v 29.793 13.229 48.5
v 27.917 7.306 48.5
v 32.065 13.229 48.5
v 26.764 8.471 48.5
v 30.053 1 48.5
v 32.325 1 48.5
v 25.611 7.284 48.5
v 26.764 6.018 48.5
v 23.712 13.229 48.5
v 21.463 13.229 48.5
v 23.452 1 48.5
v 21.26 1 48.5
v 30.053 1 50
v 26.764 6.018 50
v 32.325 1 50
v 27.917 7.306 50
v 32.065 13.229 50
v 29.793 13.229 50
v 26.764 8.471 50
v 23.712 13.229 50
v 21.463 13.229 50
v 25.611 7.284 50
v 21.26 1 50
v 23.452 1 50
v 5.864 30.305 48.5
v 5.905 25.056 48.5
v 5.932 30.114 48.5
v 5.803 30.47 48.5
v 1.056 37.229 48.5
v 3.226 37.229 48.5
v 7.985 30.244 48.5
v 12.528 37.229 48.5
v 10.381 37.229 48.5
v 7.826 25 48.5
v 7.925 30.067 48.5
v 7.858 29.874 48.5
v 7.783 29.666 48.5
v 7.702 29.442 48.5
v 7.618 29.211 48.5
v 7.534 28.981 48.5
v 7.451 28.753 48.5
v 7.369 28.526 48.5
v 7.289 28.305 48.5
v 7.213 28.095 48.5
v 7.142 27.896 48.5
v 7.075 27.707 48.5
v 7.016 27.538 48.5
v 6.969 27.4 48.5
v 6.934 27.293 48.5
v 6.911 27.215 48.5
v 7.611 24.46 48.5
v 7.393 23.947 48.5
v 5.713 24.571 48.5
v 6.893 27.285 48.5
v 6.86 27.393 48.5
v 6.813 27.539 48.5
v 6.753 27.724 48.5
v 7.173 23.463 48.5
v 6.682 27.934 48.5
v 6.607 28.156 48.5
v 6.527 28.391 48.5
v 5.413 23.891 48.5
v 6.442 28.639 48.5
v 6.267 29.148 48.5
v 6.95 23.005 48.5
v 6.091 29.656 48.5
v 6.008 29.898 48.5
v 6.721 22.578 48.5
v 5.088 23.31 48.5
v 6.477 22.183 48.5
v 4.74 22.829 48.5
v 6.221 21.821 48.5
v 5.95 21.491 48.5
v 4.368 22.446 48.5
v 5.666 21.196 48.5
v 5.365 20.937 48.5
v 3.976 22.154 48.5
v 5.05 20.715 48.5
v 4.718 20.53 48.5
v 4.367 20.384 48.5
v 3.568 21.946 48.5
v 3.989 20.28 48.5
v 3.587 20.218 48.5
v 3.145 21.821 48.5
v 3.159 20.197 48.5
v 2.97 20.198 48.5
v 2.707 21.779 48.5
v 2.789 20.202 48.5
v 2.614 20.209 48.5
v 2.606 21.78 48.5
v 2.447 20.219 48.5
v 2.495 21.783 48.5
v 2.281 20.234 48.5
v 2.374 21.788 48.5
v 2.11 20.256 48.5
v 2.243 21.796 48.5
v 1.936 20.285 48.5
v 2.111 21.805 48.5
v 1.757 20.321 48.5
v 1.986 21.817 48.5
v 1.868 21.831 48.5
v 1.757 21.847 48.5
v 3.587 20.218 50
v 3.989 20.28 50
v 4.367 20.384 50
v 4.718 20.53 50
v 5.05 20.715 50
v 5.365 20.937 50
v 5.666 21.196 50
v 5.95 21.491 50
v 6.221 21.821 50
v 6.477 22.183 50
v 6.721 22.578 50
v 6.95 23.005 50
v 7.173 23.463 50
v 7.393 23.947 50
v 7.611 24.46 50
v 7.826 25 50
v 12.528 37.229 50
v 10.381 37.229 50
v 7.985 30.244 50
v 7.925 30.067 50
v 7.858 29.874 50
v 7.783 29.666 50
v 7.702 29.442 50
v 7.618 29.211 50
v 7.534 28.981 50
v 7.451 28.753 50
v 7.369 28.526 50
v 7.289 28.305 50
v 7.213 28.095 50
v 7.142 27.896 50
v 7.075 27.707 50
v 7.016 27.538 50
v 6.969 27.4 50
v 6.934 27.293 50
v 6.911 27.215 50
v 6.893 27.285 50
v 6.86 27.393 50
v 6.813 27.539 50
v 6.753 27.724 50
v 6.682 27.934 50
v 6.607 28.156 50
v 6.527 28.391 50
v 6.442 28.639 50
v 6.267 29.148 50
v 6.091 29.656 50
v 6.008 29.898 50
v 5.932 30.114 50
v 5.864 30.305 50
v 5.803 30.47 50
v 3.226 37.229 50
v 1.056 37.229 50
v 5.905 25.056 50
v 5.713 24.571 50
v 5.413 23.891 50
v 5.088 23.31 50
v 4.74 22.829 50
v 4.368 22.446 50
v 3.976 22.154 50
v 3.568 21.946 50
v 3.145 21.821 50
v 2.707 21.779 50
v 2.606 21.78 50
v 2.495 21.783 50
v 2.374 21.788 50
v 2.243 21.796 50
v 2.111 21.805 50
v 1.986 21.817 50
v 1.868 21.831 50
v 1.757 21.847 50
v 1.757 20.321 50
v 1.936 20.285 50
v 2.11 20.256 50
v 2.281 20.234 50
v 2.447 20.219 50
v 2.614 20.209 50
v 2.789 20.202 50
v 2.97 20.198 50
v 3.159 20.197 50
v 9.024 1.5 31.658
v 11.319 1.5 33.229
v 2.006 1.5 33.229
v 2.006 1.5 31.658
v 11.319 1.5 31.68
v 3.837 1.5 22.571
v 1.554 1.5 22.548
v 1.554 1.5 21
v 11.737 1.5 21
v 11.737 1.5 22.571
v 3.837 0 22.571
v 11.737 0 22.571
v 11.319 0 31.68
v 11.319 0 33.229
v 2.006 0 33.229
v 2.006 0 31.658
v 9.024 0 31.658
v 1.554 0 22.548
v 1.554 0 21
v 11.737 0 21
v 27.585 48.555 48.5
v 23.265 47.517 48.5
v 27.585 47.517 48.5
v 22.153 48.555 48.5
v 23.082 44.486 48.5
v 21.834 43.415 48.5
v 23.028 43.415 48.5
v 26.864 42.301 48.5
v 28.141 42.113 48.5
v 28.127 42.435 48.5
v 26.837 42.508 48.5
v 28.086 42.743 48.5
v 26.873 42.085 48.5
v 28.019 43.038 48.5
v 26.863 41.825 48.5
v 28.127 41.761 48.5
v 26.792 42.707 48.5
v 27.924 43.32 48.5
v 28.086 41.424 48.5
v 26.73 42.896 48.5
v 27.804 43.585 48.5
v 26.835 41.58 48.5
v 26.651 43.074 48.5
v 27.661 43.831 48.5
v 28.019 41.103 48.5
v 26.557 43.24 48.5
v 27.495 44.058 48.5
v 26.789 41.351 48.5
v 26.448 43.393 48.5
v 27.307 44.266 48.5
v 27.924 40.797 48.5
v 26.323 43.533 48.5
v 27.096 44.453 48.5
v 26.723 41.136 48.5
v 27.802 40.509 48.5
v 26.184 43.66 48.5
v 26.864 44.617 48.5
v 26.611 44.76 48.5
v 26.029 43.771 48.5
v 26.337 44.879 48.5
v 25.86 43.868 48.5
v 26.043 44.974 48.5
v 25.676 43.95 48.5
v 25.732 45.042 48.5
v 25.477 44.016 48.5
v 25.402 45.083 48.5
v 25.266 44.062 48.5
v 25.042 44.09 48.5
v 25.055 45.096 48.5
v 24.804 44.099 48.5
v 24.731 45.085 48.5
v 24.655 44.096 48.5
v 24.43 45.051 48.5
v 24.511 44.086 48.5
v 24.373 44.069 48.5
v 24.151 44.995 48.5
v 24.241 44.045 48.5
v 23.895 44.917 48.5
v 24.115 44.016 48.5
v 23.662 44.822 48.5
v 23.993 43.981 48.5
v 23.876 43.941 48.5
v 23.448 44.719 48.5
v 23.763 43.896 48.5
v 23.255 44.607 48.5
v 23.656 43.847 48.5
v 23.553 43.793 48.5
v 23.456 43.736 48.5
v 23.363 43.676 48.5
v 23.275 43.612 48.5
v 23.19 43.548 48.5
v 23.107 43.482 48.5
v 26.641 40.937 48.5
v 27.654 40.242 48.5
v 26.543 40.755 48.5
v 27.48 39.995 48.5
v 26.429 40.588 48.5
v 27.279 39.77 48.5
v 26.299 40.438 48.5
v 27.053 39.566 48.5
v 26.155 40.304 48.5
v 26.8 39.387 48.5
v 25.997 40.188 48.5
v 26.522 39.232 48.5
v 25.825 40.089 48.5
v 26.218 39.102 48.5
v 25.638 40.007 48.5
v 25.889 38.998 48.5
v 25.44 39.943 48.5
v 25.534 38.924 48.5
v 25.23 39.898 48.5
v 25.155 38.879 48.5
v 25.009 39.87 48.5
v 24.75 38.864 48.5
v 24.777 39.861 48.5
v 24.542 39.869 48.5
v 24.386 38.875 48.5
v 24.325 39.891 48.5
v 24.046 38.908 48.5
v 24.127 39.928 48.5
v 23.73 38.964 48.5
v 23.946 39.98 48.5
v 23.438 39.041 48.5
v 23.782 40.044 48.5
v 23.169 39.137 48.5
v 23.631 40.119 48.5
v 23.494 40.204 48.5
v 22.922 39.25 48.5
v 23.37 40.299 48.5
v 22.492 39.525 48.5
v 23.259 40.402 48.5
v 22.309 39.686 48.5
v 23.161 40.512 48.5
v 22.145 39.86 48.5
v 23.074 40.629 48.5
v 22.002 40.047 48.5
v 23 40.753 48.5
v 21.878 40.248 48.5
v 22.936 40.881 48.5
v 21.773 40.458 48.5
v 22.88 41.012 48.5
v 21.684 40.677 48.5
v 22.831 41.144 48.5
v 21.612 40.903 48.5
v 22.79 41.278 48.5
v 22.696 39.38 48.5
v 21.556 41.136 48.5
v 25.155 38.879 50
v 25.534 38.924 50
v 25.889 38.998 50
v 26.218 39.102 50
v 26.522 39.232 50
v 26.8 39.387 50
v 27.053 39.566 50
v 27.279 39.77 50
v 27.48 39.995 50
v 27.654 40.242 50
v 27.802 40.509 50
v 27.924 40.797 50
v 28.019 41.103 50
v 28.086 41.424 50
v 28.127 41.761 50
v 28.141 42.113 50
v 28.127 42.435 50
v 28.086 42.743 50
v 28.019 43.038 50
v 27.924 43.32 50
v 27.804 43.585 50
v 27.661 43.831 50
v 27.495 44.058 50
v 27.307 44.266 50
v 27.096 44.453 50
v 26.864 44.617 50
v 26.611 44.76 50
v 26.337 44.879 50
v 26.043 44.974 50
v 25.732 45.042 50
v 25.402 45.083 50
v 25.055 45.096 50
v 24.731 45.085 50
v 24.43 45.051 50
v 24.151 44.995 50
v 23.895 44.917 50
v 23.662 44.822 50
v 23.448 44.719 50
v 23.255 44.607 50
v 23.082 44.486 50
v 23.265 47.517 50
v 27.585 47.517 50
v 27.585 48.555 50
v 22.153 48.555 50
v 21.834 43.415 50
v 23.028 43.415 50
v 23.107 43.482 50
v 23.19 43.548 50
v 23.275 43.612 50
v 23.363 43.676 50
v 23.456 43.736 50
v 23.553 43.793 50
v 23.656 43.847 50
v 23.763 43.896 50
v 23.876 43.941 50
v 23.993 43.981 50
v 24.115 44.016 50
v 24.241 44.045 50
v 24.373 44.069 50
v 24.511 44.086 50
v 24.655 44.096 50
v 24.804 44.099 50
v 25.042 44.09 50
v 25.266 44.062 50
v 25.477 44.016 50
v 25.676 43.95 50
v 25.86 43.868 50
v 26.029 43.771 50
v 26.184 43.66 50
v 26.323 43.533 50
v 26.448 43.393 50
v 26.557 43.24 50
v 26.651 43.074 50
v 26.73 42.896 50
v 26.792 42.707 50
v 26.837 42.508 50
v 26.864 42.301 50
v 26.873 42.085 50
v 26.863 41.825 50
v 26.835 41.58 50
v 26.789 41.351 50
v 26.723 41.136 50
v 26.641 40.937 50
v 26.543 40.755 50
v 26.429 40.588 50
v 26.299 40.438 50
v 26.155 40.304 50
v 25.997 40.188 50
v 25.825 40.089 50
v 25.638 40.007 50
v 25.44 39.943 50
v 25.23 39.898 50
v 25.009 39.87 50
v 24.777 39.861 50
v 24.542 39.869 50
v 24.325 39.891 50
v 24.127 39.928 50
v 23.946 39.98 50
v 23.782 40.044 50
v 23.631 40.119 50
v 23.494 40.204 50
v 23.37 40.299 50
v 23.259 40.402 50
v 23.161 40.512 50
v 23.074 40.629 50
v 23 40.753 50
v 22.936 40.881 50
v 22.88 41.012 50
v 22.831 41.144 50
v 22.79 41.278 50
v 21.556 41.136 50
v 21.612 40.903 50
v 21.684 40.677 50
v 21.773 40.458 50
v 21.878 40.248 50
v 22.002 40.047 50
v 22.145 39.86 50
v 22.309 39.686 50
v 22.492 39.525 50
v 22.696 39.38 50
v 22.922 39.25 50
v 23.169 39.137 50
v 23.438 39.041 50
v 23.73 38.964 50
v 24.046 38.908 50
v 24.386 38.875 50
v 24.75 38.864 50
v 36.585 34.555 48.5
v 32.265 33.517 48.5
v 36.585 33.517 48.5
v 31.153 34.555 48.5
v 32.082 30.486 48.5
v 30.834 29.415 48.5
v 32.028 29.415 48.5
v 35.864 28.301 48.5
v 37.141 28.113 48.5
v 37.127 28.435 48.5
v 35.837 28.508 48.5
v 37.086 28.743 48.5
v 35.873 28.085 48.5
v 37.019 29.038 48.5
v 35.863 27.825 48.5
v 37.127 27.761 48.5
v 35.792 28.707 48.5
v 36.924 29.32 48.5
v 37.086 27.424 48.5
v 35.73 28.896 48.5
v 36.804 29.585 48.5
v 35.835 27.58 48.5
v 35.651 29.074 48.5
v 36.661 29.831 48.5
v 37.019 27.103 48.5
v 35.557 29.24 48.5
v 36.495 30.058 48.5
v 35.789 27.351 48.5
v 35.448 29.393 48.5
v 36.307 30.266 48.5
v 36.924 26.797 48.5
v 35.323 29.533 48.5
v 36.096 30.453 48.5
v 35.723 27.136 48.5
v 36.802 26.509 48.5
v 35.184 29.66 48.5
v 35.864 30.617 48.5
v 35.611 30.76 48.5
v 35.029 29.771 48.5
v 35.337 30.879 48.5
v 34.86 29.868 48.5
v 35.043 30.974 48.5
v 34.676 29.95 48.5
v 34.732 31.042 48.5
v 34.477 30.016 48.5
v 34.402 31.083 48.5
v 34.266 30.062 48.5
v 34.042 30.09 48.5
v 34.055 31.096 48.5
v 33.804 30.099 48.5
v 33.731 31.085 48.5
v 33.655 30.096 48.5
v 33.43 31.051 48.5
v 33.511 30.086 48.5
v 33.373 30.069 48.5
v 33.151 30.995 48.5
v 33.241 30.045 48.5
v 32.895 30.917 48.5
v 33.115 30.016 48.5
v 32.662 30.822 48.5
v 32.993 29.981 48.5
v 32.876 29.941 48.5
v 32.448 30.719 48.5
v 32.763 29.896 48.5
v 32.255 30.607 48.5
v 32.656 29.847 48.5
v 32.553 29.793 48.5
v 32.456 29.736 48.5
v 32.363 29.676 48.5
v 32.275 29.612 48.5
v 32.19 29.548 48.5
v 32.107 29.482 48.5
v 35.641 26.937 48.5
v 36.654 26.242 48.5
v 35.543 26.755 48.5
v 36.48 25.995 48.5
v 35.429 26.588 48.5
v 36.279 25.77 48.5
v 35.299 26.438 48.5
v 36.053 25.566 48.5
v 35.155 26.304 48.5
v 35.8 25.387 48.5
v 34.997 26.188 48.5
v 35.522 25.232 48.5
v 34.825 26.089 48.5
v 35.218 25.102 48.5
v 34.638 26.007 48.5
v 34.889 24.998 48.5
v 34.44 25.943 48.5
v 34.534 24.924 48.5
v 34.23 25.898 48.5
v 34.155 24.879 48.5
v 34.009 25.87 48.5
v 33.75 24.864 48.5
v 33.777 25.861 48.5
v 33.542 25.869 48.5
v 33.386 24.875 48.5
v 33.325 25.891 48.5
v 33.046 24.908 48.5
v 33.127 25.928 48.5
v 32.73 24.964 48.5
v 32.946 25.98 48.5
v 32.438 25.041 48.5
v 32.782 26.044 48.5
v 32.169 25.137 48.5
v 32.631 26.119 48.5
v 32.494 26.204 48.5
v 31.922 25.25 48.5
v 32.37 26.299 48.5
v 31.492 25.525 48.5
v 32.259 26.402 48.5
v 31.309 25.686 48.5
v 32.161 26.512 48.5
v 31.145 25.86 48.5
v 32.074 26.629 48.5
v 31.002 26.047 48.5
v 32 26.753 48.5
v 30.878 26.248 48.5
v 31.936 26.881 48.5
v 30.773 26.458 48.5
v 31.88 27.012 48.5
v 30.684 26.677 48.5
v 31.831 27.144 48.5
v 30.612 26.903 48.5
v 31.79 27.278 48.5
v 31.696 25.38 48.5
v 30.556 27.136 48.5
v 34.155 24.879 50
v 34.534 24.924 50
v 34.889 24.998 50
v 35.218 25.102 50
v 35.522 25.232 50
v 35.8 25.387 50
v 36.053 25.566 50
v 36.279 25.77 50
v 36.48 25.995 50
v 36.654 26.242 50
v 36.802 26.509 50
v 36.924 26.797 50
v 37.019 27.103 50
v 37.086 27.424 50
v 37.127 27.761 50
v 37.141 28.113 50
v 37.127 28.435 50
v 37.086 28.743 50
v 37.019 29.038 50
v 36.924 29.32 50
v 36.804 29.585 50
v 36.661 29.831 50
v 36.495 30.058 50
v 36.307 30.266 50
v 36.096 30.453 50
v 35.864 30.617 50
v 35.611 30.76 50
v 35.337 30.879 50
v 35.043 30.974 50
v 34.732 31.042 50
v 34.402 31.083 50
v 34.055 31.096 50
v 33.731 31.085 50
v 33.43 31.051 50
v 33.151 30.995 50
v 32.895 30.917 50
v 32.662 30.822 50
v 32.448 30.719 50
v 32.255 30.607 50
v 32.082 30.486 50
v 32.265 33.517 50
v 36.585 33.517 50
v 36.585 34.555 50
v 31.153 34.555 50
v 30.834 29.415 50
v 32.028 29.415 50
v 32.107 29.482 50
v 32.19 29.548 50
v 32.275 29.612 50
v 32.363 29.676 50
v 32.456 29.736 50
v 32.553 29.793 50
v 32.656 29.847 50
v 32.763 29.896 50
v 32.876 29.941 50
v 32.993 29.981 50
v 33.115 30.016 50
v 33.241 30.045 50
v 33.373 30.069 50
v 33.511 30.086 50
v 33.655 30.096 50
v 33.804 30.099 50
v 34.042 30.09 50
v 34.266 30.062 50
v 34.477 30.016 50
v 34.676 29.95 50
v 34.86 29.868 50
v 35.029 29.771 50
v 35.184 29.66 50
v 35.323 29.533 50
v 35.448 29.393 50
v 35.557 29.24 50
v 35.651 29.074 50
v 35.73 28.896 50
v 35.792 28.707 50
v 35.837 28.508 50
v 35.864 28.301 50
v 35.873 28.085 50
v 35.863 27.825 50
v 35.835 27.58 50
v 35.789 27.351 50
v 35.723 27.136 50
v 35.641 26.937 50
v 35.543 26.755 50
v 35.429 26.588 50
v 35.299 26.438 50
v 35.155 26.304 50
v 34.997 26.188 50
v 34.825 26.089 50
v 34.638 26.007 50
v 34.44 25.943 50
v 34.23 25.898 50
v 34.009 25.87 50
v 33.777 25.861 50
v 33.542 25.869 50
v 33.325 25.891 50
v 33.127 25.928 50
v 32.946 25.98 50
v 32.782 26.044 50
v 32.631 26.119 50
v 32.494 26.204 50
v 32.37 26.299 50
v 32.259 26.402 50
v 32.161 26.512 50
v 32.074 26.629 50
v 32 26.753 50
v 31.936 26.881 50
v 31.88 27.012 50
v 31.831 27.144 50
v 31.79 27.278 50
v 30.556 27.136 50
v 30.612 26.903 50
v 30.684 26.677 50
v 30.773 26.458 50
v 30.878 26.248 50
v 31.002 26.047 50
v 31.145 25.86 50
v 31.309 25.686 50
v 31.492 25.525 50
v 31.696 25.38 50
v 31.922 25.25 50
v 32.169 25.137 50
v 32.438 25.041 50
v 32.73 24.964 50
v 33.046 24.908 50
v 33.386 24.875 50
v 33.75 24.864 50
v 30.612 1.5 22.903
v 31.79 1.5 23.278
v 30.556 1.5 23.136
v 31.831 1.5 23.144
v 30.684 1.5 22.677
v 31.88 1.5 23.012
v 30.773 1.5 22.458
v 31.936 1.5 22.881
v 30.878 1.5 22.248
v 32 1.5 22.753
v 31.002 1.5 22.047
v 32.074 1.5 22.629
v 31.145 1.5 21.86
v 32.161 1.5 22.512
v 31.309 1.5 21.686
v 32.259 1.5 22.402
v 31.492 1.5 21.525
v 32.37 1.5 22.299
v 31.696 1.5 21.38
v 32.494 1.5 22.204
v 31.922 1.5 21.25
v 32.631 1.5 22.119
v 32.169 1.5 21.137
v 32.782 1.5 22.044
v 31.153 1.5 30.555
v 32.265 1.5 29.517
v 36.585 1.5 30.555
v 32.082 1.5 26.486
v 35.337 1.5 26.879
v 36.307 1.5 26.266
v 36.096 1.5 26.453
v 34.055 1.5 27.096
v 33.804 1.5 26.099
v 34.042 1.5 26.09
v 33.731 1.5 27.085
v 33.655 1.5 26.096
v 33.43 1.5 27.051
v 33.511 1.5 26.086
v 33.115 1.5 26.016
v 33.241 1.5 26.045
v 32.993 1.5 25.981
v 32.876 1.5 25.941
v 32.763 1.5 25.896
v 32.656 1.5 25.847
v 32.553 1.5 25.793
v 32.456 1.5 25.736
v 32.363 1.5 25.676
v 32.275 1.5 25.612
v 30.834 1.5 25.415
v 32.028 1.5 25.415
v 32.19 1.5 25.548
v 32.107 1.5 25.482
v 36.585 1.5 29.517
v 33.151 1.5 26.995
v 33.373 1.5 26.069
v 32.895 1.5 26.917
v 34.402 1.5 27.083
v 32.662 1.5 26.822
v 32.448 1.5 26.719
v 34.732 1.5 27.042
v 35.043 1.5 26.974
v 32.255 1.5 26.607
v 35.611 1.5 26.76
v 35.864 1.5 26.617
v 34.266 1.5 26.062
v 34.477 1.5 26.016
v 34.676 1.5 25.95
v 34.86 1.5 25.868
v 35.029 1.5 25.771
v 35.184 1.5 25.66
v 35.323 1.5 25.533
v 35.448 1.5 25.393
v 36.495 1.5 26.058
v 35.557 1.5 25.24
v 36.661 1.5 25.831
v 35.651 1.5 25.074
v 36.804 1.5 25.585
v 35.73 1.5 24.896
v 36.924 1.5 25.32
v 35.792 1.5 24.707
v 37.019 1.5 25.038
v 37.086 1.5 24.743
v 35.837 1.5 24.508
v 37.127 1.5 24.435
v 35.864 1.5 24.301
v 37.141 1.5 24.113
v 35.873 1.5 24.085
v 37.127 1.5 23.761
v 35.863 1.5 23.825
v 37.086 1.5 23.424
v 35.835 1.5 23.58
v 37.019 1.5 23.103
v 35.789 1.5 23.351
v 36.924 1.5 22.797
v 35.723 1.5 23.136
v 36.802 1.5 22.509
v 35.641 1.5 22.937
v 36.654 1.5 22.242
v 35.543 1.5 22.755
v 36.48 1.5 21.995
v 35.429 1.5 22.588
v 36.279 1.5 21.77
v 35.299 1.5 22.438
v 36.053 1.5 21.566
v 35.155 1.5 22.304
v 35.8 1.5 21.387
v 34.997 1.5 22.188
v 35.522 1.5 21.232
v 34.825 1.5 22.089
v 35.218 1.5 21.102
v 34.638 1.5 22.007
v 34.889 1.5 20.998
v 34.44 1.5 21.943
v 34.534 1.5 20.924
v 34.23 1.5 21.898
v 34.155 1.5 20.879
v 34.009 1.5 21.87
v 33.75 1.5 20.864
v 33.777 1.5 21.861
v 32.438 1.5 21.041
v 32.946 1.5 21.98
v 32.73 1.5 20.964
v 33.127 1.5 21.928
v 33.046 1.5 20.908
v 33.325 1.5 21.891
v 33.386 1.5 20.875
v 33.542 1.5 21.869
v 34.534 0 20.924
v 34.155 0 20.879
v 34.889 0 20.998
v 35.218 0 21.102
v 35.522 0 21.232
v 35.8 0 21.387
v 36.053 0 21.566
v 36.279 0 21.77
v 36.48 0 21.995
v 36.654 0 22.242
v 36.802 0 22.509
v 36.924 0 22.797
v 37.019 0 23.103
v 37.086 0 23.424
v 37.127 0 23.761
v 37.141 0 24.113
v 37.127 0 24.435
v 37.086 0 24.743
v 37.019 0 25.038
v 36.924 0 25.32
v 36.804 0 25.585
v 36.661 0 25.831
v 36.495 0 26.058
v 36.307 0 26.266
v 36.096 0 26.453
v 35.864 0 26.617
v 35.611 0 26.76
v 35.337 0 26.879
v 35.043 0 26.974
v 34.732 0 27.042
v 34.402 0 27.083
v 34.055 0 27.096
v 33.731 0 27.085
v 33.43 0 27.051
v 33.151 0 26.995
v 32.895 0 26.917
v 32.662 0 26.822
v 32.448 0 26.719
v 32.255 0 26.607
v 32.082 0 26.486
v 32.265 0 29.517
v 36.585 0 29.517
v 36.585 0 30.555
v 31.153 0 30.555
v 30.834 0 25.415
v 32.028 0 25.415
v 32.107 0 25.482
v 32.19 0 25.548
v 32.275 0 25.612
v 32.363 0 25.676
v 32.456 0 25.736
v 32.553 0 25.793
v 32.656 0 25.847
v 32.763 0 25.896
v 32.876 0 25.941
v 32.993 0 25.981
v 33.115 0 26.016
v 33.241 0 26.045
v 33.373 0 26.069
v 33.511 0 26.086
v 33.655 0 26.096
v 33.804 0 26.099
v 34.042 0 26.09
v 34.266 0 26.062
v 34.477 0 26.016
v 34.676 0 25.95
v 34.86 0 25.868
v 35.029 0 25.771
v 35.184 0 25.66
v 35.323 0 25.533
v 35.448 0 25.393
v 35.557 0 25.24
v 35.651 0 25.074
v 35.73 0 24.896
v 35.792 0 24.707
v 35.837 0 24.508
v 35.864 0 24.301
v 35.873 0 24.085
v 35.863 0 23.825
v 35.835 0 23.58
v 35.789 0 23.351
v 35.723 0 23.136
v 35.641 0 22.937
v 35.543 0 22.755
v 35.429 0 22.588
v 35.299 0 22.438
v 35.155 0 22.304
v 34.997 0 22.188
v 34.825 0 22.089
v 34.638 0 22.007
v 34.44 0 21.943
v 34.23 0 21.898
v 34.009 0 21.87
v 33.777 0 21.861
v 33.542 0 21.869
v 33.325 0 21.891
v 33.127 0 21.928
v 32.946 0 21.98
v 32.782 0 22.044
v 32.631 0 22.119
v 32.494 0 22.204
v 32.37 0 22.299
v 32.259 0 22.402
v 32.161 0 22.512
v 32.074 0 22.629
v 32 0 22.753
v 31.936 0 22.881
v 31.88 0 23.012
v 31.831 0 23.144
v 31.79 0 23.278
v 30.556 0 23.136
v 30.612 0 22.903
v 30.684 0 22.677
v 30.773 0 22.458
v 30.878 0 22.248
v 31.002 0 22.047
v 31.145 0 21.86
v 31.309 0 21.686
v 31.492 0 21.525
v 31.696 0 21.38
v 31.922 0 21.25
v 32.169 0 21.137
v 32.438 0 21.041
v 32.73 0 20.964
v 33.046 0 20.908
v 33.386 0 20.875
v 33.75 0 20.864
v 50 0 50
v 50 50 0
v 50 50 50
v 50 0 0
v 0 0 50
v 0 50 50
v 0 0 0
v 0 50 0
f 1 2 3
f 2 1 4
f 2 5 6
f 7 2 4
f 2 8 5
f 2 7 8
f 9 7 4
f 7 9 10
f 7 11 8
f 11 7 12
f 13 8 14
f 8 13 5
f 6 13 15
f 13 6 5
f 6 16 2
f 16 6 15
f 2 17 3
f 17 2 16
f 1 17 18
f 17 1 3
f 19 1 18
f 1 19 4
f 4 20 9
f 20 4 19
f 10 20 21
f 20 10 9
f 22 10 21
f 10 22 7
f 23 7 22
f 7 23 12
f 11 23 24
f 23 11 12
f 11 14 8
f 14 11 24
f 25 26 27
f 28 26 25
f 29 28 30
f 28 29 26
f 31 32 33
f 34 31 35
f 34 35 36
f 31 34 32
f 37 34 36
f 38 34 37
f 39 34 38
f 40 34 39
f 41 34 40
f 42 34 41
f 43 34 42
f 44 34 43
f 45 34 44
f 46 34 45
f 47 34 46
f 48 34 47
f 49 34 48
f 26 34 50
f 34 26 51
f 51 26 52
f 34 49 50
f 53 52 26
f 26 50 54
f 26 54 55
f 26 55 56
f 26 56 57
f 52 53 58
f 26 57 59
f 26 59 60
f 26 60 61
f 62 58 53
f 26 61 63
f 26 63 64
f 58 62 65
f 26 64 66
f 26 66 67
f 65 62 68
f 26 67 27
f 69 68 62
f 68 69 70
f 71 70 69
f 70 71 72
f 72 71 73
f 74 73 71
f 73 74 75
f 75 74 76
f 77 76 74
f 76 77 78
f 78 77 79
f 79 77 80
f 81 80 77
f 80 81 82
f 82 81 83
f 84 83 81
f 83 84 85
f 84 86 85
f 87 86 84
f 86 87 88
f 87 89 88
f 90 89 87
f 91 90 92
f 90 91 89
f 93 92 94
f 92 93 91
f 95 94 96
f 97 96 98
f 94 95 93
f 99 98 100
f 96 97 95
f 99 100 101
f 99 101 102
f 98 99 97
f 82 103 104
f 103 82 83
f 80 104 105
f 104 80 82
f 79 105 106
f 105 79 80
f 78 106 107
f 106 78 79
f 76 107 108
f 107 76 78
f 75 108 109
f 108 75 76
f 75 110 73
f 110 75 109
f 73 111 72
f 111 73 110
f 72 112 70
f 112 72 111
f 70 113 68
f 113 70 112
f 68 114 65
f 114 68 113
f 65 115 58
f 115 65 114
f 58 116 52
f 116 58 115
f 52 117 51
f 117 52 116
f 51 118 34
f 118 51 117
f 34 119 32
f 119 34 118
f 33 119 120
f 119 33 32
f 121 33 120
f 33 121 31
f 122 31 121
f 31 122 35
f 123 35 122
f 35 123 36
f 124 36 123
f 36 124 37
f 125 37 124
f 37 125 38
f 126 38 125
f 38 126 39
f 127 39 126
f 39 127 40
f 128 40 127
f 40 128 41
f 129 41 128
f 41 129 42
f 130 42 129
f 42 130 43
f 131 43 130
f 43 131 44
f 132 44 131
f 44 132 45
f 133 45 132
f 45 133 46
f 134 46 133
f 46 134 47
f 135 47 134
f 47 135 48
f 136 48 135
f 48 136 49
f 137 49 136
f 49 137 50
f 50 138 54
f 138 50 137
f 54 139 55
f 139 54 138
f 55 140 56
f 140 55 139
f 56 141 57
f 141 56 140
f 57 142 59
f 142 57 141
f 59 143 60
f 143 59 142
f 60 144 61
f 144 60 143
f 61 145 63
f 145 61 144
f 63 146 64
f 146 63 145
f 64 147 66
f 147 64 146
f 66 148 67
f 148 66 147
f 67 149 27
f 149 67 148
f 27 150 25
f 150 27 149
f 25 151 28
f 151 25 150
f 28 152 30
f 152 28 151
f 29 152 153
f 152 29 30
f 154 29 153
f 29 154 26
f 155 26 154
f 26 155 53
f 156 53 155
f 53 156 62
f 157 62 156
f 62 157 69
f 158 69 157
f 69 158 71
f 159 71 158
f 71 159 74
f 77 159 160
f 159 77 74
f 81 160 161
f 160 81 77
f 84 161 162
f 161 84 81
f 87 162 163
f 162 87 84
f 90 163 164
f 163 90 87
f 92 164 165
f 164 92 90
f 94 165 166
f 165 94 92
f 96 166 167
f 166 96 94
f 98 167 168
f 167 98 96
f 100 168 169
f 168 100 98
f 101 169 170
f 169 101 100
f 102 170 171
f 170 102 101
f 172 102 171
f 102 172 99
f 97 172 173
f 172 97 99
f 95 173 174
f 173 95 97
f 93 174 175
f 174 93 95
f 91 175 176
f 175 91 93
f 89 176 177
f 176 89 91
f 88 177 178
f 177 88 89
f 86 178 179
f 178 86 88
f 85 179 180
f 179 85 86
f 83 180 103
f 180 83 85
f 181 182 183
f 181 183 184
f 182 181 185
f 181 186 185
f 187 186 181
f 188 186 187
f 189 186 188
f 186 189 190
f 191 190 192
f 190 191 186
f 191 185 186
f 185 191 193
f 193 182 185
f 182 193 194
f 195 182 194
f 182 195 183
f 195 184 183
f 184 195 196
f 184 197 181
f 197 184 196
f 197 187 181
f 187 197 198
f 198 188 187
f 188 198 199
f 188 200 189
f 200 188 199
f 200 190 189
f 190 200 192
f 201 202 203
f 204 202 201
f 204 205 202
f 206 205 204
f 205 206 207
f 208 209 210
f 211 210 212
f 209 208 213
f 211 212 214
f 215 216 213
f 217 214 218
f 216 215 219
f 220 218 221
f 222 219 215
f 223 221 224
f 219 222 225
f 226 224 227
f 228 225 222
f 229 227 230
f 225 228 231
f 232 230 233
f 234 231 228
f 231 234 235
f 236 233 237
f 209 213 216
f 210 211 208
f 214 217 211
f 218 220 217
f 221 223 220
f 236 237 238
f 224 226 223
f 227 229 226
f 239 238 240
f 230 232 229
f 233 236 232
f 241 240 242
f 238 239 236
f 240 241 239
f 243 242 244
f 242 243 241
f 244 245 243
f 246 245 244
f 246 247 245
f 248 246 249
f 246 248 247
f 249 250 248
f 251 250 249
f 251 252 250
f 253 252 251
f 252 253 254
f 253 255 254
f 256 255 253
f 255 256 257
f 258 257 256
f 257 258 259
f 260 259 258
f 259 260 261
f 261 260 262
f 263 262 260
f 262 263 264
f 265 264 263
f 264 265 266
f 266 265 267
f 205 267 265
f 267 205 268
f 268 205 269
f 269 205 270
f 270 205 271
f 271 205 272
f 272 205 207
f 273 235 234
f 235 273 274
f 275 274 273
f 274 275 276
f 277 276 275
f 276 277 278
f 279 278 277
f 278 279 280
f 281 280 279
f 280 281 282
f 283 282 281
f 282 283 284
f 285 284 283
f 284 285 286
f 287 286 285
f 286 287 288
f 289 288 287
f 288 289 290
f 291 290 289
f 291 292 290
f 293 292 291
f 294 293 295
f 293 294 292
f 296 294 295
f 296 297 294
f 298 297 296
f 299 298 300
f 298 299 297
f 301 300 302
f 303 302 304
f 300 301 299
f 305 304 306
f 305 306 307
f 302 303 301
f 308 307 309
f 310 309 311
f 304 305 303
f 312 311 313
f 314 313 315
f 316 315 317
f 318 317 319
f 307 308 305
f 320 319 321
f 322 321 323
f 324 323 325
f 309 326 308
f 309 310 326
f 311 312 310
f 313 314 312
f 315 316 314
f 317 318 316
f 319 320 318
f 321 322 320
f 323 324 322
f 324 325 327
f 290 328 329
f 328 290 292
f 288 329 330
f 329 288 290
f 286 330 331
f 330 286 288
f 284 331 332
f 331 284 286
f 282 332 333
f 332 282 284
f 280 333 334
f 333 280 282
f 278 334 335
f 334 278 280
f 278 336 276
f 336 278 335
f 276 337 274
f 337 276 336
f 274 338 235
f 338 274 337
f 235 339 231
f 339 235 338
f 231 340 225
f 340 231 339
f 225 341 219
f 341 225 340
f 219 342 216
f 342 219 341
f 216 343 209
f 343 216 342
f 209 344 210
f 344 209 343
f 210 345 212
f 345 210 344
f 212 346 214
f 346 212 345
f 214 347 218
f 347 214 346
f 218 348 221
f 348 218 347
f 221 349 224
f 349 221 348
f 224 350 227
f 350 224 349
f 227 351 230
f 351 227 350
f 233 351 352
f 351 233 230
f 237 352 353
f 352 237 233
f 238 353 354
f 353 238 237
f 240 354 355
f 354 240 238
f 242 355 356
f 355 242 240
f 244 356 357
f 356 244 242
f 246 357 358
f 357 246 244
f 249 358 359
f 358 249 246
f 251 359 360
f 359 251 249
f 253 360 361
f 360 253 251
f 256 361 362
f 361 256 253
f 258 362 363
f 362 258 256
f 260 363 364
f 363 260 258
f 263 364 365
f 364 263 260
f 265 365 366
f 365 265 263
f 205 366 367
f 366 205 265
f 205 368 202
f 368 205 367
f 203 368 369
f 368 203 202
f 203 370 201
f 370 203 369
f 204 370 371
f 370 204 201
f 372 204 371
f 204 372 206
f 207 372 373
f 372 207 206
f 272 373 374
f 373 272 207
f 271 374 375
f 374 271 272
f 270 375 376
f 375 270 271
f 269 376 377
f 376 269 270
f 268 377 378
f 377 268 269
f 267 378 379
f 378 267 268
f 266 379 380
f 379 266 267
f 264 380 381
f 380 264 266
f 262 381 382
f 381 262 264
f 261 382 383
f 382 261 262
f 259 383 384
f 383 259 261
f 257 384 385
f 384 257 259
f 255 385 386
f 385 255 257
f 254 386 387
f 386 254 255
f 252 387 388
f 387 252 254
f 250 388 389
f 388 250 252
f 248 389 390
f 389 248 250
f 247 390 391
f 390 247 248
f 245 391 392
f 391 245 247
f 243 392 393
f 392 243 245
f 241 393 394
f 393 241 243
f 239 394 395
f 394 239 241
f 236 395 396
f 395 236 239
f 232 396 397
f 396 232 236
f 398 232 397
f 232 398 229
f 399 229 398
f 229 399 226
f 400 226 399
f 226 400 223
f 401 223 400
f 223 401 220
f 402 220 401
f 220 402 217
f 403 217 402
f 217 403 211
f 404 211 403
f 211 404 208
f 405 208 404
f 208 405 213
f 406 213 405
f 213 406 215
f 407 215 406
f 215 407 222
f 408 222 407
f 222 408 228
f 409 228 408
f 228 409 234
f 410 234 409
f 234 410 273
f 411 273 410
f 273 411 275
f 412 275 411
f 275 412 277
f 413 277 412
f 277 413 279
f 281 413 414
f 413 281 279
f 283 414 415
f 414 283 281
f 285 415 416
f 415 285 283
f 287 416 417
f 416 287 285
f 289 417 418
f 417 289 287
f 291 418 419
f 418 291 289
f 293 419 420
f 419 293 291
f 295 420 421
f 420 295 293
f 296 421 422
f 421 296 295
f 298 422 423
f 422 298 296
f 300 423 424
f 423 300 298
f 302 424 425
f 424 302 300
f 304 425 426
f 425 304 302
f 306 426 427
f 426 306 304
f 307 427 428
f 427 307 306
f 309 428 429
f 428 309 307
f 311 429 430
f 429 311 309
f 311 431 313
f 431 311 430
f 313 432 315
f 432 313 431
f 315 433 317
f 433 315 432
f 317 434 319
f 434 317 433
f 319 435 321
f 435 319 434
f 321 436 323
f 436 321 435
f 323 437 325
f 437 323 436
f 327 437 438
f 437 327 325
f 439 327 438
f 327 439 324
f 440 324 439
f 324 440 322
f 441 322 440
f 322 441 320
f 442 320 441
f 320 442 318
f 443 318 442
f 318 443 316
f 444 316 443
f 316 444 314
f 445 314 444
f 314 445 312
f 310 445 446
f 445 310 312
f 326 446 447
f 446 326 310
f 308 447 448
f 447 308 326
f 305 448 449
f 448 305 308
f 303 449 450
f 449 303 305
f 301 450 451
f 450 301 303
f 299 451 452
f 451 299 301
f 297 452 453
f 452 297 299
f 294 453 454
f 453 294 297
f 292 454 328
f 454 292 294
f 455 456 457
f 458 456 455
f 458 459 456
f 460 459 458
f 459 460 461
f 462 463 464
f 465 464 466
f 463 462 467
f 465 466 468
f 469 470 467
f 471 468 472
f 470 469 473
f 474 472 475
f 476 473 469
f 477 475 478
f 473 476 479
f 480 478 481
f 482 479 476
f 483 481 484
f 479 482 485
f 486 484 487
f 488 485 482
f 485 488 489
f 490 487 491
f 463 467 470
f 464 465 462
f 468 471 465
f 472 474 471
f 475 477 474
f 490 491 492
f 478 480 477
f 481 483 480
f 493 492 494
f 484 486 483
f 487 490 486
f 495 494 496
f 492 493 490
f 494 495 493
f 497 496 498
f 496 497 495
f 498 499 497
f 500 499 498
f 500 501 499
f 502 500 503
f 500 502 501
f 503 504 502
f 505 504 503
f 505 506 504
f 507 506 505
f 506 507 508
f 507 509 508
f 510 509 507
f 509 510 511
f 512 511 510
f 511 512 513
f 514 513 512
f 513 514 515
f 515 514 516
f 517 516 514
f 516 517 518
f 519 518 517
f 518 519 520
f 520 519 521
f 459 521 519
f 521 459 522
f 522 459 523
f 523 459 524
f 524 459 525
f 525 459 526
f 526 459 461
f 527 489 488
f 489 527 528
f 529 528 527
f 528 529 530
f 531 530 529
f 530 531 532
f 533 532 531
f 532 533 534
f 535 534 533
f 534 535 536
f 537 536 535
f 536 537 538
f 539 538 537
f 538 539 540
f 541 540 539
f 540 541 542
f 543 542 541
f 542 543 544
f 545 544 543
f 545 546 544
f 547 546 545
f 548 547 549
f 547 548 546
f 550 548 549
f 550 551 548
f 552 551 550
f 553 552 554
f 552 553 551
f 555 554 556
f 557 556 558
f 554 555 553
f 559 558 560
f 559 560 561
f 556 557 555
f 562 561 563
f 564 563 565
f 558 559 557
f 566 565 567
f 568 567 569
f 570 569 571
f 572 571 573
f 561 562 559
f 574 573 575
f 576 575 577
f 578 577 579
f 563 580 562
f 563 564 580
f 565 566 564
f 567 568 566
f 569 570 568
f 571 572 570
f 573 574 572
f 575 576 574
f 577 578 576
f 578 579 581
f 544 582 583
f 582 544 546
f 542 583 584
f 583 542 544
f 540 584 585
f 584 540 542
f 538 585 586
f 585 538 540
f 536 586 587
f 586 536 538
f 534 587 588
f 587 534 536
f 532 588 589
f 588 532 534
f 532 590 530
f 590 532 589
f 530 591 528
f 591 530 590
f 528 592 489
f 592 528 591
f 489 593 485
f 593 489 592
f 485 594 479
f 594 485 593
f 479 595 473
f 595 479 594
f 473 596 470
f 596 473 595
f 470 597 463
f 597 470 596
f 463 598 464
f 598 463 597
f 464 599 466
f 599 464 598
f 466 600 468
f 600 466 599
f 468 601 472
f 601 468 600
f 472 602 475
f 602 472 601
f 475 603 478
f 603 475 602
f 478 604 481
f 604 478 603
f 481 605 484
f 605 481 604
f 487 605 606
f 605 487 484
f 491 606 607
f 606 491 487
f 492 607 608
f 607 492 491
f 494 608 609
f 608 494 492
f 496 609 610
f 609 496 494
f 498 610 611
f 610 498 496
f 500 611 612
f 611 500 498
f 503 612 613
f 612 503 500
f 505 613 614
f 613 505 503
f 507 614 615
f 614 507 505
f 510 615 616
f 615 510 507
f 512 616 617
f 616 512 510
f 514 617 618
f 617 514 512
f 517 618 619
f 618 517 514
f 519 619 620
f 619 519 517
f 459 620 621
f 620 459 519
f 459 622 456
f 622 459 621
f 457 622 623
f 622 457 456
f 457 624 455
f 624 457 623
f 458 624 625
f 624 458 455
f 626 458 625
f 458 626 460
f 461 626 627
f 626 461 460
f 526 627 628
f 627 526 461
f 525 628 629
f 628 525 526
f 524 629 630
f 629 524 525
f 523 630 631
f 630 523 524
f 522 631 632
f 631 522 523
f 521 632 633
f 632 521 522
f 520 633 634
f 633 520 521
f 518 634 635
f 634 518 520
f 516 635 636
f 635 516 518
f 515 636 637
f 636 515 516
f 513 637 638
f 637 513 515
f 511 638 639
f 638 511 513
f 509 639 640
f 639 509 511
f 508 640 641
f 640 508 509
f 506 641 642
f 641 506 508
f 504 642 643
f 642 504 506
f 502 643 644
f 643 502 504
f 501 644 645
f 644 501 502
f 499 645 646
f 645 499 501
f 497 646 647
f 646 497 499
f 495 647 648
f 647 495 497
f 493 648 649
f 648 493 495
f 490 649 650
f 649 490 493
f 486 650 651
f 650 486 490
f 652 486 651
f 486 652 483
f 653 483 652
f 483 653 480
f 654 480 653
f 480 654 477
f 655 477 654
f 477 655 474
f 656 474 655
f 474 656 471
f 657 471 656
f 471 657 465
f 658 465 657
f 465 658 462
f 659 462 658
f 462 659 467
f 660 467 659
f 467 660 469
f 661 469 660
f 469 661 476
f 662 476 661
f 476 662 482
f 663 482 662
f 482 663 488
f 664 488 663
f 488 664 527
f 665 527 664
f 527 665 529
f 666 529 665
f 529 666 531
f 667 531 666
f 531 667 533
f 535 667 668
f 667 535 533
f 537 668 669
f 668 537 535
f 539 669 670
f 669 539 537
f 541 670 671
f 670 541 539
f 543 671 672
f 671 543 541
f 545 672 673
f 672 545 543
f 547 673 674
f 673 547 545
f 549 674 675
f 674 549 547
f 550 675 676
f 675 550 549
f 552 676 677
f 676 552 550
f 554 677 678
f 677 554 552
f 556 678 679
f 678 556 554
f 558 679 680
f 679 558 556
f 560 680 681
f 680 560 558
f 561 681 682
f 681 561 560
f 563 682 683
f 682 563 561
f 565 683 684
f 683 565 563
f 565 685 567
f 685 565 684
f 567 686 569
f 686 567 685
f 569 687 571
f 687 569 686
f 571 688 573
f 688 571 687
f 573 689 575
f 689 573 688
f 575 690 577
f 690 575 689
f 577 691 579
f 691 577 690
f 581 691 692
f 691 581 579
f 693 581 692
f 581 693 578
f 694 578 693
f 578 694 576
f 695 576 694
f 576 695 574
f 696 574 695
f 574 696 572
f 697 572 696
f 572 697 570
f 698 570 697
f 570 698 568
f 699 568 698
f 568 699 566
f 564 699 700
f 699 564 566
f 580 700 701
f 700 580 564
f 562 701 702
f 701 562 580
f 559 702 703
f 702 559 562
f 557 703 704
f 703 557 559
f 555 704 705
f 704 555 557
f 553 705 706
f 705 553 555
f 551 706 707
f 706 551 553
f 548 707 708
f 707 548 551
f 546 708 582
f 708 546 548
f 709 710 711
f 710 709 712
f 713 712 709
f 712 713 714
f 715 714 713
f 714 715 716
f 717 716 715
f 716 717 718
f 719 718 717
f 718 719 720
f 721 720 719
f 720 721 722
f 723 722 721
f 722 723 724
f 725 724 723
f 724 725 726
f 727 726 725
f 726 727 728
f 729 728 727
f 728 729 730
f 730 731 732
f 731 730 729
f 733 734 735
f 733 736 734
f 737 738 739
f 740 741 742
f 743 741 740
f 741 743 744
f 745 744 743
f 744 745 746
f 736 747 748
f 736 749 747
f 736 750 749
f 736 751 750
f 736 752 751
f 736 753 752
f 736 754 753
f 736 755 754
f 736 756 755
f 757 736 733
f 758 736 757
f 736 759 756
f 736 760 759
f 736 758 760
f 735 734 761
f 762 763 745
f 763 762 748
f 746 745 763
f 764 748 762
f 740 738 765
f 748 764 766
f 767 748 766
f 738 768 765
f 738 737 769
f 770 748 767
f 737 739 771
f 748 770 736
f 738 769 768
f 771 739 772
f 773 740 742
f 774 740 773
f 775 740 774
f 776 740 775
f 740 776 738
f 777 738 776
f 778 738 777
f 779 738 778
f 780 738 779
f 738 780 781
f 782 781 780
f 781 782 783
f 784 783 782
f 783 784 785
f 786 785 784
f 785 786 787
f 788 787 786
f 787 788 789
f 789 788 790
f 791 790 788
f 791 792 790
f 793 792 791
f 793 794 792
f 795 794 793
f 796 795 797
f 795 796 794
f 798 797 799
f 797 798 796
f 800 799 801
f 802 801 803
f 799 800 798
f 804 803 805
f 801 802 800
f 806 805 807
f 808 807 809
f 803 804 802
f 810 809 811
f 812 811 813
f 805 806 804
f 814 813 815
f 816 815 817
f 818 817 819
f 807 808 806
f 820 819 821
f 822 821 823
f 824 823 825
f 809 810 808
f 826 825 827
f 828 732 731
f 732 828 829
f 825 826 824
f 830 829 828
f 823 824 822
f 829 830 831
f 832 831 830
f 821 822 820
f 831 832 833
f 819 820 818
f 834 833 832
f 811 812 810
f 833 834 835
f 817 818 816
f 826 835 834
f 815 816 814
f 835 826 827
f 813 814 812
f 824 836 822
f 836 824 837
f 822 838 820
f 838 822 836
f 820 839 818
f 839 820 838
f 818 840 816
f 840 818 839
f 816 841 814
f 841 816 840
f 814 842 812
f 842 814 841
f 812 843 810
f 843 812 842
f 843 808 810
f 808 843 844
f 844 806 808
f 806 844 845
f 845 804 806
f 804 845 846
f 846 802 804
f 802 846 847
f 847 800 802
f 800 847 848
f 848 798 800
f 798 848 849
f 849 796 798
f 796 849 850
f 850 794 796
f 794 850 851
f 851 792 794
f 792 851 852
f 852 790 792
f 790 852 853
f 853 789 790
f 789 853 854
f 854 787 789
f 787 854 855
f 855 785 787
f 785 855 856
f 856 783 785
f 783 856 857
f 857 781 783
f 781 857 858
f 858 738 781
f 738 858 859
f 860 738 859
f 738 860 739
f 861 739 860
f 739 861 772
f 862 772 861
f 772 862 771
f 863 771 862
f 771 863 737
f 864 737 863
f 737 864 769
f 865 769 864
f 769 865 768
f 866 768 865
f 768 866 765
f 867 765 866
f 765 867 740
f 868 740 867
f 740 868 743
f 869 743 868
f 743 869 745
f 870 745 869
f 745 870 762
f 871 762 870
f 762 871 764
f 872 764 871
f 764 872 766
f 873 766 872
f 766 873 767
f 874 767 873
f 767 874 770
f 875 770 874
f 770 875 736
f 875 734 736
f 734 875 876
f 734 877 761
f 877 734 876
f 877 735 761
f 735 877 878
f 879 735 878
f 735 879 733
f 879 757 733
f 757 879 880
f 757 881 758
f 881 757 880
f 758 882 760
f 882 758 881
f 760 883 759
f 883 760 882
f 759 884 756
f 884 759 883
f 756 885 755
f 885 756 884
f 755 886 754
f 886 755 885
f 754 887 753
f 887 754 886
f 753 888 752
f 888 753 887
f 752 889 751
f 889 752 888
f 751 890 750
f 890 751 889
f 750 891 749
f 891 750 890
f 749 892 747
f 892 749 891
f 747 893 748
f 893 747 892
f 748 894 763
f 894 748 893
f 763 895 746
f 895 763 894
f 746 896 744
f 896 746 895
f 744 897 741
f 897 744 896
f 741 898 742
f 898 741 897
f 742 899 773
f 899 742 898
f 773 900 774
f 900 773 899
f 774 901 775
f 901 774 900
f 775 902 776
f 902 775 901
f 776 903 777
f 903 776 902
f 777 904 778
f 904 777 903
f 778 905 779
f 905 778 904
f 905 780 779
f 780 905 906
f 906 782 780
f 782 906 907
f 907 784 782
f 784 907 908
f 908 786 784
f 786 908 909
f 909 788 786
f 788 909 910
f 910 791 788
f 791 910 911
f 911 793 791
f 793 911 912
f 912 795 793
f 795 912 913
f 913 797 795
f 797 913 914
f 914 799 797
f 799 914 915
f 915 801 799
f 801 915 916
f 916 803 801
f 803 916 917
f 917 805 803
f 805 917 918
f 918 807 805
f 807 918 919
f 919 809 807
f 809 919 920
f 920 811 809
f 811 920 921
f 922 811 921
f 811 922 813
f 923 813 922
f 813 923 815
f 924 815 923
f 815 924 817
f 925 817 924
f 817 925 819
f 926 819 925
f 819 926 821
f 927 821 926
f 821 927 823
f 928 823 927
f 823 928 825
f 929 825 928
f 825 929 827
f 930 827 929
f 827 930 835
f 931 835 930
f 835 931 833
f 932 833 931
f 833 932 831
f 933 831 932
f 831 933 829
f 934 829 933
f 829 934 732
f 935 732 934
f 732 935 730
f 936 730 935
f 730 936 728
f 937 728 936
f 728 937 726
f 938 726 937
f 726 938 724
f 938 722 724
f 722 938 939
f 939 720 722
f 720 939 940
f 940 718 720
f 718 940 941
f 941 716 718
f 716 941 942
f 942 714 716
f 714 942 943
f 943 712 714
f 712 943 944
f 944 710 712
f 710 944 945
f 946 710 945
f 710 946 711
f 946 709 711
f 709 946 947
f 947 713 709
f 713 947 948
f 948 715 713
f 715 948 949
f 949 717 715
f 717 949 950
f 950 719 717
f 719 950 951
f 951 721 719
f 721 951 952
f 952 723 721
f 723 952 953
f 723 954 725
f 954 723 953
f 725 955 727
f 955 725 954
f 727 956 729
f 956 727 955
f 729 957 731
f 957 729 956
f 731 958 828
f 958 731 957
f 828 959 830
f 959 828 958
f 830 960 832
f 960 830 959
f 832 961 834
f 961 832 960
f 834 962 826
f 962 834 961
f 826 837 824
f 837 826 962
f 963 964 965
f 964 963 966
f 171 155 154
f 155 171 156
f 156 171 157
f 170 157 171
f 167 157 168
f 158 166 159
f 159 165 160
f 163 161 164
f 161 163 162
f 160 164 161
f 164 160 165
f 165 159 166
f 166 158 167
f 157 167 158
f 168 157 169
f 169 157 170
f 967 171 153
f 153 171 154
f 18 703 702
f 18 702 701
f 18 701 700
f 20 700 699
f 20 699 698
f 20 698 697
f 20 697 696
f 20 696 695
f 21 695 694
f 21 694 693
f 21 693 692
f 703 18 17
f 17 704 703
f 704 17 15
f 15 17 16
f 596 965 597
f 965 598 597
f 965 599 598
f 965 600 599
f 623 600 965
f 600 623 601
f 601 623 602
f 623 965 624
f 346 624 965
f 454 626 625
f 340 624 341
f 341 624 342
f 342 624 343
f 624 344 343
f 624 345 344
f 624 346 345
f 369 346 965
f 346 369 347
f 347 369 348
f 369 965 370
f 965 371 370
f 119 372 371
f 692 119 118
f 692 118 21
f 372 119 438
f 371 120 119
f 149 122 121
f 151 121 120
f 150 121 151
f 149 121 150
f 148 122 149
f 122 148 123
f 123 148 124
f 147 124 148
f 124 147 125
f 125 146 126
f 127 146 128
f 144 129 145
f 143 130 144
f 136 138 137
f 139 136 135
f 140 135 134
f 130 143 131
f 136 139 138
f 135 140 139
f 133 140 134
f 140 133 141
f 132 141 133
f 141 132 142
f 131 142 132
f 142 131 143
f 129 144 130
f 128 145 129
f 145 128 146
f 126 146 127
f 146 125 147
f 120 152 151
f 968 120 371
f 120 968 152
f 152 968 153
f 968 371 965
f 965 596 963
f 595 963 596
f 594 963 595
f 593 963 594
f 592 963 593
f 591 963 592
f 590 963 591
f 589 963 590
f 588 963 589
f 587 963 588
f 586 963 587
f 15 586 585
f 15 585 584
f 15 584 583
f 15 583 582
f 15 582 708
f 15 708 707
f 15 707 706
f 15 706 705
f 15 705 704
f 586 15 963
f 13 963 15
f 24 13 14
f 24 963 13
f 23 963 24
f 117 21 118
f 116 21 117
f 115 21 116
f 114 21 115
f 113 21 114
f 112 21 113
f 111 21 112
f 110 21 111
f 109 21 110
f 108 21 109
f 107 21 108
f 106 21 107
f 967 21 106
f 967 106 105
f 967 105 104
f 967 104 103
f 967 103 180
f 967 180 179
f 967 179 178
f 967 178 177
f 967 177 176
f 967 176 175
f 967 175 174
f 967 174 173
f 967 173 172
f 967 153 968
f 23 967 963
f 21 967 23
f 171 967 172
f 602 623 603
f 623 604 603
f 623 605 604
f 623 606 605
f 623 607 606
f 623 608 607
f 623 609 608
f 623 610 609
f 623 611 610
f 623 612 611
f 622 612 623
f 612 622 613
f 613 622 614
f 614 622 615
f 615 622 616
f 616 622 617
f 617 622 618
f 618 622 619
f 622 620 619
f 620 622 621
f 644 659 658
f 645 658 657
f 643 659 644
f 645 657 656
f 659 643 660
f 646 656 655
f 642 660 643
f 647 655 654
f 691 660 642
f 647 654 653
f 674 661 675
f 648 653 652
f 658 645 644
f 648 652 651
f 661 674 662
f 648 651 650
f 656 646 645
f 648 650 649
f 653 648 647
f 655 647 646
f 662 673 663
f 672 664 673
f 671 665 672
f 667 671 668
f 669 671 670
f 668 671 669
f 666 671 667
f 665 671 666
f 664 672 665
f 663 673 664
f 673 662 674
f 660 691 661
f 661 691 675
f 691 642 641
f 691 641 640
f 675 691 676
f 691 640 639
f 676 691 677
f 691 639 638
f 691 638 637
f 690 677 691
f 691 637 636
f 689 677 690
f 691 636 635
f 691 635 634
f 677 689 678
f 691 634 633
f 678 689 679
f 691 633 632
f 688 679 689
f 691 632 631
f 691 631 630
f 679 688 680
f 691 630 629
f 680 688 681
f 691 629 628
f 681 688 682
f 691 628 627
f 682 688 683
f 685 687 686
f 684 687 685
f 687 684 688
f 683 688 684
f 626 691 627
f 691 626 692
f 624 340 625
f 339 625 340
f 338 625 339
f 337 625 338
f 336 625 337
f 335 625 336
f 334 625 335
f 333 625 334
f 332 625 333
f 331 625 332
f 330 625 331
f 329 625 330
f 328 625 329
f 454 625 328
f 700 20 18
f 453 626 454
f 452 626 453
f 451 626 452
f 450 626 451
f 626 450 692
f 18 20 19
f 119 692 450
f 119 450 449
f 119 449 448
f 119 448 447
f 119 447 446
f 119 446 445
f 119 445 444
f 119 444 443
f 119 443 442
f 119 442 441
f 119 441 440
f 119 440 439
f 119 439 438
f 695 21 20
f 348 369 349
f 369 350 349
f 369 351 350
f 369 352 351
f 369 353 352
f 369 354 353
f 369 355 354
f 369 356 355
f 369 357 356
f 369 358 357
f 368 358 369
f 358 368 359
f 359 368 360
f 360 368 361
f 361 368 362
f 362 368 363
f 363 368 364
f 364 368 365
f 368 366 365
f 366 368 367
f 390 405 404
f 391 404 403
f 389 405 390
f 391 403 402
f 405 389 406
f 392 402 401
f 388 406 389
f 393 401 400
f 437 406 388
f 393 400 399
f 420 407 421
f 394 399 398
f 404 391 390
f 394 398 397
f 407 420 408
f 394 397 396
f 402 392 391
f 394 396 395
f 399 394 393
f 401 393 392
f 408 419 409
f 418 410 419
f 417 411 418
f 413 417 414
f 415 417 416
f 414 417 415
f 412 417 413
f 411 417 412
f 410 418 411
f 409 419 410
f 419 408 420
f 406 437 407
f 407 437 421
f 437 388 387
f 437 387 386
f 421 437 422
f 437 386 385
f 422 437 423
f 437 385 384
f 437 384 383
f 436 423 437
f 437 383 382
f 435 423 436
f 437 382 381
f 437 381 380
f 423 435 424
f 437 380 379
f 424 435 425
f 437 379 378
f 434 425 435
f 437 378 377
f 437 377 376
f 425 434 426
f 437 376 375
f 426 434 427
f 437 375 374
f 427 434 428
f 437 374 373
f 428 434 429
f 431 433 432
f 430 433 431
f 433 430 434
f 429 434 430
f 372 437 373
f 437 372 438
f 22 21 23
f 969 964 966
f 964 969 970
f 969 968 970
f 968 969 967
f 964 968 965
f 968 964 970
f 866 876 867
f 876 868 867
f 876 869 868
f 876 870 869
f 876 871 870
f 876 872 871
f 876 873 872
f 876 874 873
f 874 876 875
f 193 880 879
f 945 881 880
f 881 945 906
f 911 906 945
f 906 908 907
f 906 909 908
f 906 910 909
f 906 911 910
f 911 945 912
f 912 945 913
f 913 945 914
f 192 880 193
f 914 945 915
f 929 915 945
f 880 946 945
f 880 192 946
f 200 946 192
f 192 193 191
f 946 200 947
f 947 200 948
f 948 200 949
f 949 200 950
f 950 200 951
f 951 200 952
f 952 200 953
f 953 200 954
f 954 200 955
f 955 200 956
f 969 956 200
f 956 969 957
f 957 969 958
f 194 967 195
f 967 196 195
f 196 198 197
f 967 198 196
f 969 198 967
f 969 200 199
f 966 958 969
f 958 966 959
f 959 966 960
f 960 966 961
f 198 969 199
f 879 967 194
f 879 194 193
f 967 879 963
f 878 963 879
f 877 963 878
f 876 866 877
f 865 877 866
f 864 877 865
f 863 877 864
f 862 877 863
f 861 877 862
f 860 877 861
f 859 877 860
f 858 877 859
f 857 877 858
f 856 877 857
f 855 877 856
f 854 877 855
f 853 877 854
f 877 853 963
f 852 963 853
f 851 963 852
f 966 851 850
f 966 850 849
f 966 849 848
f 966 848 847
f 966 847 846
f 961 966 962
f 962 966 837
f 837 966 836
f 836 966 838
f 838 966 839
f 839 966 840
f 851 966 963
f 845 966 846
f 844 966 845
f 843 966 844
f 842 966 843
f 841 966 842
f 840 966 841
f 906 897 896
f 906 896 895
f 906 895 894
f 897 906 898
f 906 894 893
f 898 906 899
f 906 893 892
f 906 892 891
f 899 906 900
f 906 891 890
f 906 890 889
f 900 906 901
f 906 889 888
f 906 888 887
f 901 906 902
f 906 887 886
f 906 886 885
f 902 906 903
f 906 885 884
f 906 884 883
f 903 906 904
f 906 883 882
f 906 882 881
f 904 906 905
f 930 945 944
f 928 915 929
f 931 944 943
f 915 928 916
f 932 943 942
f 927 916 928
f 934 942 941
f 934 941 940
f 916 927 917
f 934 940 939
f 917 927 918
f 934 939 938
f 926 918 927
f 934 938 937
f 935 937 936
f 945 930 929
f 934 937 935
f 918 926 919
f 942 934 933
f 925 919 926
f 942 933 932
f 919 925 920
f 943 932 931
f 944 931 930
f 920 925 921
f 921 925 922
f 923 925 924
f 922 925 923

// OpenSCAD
s= 50;
fs = s/3;
fsn = s/5;
f = "Arial";


difference(){
cube(s);
union(){

translate([s/2-4,1,s-1.5])linear_extrude(height = 3)text(text = "x", size = fs, font = "Arial");
translate([1,s/2,s-1.5])linear_extrude(height = 3)text(text = "y", size = fs, font = "Arial");
translate([1,1.5,s/2-4])rotate([90,0,0])linear_extrude(height = 3)text(text = "z", size = fs, font = "Arial");
    
    
  
translate([s/2-4,s-fsn-1,s-1.5])linear_extrude(height = 3)text(text = str(s/10), size = fsn, font = "Arial");
translate([s-fsn*2,s/2,s-1.5])linear_extrude(height = 3)text(text = str(s/10), size = fsn, font = "Arial");
translate([s-fsn*2,1.5,s/2-4])rotate([90,0,0])linear_extrude(height = 3)text(text = str(s/10), size = fsn, font = "Arial");

}
}
